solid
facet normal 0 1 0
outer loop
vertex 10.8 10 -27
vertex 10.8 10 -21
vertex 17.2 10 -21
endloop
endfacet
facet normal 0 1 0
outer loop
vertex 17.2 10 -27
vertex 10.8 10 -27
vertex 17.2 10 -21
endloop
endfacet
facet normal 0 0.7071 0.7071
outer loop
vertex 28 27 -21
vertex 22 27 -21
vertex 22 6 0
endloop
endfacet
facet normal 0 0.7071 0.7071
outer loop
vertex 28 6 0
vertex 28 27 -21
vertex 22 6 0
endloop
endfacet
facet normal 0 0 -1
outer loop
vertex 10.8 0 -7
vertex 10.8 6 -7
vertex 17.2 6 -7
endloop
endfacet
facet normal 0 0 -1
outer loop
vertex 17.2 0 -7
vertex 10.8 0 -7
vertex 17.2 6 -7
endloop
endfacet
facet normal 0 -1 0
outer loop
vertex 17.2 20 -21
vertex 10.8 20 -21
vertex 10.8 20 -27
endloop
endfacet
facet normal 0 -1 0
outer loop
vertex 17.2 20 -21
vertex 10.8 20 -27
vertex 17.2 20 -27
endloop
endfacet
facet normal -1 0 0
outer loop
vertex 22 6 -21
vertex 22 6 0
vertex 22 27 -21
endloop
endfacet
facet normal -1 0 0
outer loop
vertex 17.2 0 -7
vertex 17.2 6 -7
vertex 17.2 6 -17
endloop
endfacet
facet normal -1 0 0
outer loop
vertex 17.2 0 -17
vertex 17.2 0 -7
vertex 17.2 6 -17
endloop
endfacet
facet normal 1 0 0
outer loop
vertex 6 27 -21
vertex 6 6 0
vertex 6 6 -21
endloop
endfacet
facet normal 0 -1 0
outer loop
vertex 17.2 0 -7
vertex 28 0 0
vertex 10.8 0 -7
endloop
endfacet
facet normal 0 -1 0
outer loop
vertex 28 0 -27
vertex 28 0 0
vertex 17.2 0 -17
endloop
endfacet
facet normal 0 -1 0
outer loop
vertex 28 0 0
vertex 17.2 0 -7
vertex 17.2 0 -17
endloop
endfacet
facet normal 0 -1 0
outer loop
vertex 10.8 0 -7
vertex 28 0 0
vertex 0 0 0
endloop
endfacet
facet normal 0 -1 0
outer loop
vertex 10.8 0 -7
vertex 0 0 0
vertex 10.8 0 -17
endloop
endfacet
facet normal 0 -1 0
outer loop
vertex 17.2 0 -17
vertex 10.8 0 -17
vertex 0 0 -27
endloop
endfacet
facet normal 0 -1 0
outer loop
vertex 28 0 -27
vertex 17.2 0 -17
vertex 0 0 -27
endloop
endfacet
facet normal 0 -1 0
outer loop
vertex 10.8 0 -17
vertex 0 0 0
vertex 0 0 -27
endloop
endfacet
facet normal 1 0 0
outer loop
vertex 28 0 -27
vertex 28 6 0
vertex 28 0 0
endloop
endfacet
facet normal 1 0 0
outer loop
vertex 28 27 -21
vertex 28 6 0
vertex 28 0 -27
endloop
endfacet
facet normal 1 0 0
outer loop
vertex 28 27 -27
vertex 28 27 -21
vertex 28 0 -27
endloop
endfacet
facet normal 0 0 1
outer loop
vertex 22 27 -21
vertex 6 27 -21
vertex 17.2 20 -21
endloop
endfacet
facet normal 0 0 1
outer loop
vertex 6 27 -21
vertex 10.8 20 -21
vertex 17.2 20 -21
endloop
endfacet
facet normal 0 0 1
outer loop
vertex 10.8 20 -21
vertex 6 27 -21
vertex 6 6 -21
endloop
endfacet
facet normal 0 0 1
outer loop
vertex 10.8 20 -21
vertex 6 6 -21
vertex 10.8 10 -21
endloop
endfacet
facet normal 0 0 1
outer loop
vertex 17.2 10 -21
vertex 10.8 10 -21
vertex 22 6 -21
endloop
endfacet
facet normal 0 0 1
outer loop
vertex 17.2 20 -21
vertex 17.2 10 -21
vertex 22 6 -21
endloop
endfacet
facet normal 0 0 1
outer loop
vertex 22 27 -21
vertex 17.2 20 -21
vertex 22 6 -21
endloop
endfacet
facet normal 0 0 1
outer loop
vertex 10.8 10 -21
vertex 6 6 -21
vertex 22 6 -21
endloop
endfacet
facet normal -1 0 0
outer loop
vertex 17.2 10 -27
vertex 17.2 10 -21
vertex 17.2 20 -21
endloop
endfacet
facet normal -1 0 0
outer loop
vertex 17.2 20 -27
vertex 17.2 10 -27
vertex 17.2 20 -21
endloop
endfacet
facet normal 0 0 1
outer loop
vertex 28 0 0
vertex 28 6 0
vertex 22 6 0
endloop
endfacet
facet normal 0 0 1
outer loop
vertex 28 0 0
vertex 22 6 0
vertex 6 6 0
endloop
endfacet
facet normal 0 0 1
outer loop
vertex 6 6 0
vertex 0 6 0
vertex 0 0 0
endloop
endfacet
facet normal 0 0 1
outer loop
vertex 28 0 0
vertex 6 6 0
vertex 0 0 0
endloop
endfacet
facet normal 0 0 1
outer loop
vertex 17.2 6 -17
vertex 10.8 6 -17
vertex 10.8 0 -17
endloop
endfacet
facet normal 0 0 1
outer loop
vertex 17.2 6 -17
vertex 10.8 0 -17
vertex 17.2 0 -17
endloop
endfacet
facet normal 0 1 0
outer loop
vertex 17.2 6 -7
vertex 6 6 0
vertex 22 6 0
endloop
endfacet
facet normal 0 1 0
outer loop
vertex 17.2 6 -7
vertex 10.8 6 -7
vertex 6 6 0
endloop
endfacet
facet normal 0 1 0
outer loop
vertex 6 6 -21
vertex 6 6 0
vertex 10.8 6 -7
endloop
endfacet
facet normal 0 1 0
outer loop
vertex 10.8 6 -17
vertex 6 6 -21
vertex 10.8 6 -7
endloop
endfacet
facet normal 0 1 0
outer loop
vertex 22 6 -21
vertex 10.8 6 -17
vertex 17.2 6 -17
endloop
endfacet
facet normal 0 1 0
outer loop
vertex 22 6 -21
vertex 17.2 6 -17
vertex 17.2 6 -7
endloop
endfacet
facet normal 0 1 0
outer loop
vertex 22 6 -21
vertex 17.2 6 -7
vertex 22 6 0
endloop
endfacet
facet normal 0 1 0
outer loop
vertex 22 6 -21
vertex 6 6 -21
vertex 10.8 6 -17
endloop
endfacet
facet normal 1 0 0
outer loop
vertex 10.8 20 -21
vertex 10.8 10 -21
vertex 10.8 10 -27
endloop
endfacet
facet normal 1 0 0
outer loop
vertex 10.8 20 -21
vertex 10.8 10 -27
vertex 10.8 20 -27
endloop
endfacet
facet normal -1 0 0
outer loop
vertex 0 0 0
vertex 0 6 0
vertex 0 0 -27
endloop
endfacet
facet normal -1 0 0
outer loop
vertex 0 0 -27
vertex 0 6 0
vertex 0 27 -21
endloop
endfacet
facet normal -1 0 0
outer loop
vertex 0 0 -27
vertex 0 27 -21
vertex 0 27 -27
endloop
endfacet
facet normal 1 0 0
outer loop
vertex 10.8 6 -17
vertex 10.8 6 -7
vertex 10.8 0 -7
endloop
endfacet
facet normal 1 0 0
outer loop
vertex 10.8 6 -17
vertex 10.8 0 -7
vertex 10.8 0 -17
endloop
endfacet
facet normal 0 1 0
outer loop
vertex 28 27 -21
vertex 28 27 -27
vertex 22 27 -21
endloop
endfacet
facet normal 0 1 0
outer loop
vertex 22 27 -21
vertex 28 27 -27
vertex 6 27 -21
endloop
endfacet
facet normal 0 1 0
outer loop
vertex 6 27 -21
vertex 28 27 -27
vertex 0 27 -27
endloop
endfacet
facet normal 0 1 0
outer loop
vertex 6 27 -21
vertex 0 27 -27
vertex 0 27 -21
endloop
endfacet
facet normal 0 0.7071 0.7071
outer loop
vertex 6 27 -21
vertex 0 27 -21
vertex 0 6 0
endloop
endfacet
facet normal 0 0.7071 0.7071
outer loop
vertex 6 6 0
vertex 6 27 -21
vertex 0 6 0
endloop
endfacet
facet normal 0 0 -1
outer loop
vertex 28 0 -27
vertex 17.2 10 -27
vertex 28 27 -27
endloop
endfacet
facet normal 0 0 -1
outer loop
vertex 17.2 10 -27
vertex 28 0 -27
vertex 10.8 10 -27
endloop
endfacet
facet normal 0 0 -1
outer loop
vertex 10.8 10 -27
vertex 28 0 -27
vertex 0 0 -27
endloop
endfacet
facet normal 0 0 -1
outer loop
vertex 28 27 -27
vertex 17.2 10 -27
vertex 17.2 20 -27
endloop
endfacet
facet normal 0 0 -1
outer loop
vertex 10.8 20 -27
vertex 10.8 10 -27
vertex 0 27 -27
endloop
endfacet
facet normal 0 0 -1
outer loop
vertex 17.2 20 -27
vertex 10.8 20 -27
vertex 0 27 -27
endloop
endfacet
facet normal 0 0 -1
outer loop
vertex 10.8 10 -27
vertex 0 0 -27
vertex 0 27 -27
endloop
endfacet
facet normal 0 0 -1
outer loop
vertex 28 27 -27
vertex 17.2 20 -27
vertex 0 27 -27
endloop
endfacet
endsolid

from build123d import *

# Parameters (mm, degrees)
SALIENTE_EXTRUIR1_DEPTH = 28
VACIADO2_START          = 6
VACIADO2_OUTLINE_W      = 16
VACIADO2_OUTLINE_H      = 23
VACIADO2_DEPTH          = 21
CORTAR_EXTRUIR1_REACH   = 46.204
CROQUIS2_W              = 6.4
CROQUIS2_H              = 10
CORTAR_EXTRUIR2_REACH   = 46.204
CROQUIS4_W              = 6.4
CROQUIS4_H              = 10


# Read off the part's stored shape, not the designer's step: Vaciado2
with BuildPart() as part:
    # Croquis1 → Saliente-Extruir1 (new body)
    with BuildSketch(Plane(origin=(0, 0, 0), x_dir=(0, 0, -1), z_dir=(1, 0, 0))):
        Polygon((0, 0), (27, 0), (27, 27), (21, 27), (0, 6), align=None)
    extrude(amount=SALIENTE_EXTRUIR1_DEPTH)

    # Vaciado2 outline → Vaciado2 (cut)
    with BuildSketch(Plane(origin=(0, 0, 0), x_dir=(1, 0, 0), z_dir=(0, 1, 0)).offset(VACIADO2_START)):
        with Locations((14, 9.5)):
            Rectangle(VACIADO2_OUTLINE_W, VACIADO2_OUTLINE_H)
    extrude(amount=VACIADO2_DEPTH, mode=Mode.SUBTRACT)

    # Croquis2 → Cortar-Extruir1 (cut, up to next)
    with BuildSketch(Plane.XY.offset(-21), mode=Mode.PRIVATE) as cortar_extruir1_sk1:
        with Locations((14, 15)):
            Rectangle(CROQUIS2_W, CROQUIS2_H)
    cortar_extruir1_tool1 = extrude(cortar_extruir1_sk1.sketch, amount=-CORTAR_EXTRUIR1_REACH, mode=Mode.PRIVATE) & part.part
    add(cortar_extruir1_tool1.solids().sort_by_distance((14, 15, -21))[0], mode=Mode.SUBTRACT)

    # Croquis4 → Cortar-Extruir2 (cut, up to next)
    with BuildSketch(Plane(origin=(0, 6, 0), x_dir=(1, 0, 0), z_dir=(0, 1, 0)), mode=Mode.PRIVATE) as cortar_extruir2_sk1:
        with Locations((14, 12)):
            Rectangle(CROQUIS4_W, CROQUIS4_H)
    cortar_extruir2_tool1 = extrude(cortar_extruir2_sk1.sketch, amount=-CORTAR_EXTRUIR2_REACH, mode=Mode.PRIVATE) & part.part
    add(cortar_extruir2_tool1.solids().sort_by_distance((14, 6, -12))[0], mode=Mode.SUBTRACT)


solid = part.part
